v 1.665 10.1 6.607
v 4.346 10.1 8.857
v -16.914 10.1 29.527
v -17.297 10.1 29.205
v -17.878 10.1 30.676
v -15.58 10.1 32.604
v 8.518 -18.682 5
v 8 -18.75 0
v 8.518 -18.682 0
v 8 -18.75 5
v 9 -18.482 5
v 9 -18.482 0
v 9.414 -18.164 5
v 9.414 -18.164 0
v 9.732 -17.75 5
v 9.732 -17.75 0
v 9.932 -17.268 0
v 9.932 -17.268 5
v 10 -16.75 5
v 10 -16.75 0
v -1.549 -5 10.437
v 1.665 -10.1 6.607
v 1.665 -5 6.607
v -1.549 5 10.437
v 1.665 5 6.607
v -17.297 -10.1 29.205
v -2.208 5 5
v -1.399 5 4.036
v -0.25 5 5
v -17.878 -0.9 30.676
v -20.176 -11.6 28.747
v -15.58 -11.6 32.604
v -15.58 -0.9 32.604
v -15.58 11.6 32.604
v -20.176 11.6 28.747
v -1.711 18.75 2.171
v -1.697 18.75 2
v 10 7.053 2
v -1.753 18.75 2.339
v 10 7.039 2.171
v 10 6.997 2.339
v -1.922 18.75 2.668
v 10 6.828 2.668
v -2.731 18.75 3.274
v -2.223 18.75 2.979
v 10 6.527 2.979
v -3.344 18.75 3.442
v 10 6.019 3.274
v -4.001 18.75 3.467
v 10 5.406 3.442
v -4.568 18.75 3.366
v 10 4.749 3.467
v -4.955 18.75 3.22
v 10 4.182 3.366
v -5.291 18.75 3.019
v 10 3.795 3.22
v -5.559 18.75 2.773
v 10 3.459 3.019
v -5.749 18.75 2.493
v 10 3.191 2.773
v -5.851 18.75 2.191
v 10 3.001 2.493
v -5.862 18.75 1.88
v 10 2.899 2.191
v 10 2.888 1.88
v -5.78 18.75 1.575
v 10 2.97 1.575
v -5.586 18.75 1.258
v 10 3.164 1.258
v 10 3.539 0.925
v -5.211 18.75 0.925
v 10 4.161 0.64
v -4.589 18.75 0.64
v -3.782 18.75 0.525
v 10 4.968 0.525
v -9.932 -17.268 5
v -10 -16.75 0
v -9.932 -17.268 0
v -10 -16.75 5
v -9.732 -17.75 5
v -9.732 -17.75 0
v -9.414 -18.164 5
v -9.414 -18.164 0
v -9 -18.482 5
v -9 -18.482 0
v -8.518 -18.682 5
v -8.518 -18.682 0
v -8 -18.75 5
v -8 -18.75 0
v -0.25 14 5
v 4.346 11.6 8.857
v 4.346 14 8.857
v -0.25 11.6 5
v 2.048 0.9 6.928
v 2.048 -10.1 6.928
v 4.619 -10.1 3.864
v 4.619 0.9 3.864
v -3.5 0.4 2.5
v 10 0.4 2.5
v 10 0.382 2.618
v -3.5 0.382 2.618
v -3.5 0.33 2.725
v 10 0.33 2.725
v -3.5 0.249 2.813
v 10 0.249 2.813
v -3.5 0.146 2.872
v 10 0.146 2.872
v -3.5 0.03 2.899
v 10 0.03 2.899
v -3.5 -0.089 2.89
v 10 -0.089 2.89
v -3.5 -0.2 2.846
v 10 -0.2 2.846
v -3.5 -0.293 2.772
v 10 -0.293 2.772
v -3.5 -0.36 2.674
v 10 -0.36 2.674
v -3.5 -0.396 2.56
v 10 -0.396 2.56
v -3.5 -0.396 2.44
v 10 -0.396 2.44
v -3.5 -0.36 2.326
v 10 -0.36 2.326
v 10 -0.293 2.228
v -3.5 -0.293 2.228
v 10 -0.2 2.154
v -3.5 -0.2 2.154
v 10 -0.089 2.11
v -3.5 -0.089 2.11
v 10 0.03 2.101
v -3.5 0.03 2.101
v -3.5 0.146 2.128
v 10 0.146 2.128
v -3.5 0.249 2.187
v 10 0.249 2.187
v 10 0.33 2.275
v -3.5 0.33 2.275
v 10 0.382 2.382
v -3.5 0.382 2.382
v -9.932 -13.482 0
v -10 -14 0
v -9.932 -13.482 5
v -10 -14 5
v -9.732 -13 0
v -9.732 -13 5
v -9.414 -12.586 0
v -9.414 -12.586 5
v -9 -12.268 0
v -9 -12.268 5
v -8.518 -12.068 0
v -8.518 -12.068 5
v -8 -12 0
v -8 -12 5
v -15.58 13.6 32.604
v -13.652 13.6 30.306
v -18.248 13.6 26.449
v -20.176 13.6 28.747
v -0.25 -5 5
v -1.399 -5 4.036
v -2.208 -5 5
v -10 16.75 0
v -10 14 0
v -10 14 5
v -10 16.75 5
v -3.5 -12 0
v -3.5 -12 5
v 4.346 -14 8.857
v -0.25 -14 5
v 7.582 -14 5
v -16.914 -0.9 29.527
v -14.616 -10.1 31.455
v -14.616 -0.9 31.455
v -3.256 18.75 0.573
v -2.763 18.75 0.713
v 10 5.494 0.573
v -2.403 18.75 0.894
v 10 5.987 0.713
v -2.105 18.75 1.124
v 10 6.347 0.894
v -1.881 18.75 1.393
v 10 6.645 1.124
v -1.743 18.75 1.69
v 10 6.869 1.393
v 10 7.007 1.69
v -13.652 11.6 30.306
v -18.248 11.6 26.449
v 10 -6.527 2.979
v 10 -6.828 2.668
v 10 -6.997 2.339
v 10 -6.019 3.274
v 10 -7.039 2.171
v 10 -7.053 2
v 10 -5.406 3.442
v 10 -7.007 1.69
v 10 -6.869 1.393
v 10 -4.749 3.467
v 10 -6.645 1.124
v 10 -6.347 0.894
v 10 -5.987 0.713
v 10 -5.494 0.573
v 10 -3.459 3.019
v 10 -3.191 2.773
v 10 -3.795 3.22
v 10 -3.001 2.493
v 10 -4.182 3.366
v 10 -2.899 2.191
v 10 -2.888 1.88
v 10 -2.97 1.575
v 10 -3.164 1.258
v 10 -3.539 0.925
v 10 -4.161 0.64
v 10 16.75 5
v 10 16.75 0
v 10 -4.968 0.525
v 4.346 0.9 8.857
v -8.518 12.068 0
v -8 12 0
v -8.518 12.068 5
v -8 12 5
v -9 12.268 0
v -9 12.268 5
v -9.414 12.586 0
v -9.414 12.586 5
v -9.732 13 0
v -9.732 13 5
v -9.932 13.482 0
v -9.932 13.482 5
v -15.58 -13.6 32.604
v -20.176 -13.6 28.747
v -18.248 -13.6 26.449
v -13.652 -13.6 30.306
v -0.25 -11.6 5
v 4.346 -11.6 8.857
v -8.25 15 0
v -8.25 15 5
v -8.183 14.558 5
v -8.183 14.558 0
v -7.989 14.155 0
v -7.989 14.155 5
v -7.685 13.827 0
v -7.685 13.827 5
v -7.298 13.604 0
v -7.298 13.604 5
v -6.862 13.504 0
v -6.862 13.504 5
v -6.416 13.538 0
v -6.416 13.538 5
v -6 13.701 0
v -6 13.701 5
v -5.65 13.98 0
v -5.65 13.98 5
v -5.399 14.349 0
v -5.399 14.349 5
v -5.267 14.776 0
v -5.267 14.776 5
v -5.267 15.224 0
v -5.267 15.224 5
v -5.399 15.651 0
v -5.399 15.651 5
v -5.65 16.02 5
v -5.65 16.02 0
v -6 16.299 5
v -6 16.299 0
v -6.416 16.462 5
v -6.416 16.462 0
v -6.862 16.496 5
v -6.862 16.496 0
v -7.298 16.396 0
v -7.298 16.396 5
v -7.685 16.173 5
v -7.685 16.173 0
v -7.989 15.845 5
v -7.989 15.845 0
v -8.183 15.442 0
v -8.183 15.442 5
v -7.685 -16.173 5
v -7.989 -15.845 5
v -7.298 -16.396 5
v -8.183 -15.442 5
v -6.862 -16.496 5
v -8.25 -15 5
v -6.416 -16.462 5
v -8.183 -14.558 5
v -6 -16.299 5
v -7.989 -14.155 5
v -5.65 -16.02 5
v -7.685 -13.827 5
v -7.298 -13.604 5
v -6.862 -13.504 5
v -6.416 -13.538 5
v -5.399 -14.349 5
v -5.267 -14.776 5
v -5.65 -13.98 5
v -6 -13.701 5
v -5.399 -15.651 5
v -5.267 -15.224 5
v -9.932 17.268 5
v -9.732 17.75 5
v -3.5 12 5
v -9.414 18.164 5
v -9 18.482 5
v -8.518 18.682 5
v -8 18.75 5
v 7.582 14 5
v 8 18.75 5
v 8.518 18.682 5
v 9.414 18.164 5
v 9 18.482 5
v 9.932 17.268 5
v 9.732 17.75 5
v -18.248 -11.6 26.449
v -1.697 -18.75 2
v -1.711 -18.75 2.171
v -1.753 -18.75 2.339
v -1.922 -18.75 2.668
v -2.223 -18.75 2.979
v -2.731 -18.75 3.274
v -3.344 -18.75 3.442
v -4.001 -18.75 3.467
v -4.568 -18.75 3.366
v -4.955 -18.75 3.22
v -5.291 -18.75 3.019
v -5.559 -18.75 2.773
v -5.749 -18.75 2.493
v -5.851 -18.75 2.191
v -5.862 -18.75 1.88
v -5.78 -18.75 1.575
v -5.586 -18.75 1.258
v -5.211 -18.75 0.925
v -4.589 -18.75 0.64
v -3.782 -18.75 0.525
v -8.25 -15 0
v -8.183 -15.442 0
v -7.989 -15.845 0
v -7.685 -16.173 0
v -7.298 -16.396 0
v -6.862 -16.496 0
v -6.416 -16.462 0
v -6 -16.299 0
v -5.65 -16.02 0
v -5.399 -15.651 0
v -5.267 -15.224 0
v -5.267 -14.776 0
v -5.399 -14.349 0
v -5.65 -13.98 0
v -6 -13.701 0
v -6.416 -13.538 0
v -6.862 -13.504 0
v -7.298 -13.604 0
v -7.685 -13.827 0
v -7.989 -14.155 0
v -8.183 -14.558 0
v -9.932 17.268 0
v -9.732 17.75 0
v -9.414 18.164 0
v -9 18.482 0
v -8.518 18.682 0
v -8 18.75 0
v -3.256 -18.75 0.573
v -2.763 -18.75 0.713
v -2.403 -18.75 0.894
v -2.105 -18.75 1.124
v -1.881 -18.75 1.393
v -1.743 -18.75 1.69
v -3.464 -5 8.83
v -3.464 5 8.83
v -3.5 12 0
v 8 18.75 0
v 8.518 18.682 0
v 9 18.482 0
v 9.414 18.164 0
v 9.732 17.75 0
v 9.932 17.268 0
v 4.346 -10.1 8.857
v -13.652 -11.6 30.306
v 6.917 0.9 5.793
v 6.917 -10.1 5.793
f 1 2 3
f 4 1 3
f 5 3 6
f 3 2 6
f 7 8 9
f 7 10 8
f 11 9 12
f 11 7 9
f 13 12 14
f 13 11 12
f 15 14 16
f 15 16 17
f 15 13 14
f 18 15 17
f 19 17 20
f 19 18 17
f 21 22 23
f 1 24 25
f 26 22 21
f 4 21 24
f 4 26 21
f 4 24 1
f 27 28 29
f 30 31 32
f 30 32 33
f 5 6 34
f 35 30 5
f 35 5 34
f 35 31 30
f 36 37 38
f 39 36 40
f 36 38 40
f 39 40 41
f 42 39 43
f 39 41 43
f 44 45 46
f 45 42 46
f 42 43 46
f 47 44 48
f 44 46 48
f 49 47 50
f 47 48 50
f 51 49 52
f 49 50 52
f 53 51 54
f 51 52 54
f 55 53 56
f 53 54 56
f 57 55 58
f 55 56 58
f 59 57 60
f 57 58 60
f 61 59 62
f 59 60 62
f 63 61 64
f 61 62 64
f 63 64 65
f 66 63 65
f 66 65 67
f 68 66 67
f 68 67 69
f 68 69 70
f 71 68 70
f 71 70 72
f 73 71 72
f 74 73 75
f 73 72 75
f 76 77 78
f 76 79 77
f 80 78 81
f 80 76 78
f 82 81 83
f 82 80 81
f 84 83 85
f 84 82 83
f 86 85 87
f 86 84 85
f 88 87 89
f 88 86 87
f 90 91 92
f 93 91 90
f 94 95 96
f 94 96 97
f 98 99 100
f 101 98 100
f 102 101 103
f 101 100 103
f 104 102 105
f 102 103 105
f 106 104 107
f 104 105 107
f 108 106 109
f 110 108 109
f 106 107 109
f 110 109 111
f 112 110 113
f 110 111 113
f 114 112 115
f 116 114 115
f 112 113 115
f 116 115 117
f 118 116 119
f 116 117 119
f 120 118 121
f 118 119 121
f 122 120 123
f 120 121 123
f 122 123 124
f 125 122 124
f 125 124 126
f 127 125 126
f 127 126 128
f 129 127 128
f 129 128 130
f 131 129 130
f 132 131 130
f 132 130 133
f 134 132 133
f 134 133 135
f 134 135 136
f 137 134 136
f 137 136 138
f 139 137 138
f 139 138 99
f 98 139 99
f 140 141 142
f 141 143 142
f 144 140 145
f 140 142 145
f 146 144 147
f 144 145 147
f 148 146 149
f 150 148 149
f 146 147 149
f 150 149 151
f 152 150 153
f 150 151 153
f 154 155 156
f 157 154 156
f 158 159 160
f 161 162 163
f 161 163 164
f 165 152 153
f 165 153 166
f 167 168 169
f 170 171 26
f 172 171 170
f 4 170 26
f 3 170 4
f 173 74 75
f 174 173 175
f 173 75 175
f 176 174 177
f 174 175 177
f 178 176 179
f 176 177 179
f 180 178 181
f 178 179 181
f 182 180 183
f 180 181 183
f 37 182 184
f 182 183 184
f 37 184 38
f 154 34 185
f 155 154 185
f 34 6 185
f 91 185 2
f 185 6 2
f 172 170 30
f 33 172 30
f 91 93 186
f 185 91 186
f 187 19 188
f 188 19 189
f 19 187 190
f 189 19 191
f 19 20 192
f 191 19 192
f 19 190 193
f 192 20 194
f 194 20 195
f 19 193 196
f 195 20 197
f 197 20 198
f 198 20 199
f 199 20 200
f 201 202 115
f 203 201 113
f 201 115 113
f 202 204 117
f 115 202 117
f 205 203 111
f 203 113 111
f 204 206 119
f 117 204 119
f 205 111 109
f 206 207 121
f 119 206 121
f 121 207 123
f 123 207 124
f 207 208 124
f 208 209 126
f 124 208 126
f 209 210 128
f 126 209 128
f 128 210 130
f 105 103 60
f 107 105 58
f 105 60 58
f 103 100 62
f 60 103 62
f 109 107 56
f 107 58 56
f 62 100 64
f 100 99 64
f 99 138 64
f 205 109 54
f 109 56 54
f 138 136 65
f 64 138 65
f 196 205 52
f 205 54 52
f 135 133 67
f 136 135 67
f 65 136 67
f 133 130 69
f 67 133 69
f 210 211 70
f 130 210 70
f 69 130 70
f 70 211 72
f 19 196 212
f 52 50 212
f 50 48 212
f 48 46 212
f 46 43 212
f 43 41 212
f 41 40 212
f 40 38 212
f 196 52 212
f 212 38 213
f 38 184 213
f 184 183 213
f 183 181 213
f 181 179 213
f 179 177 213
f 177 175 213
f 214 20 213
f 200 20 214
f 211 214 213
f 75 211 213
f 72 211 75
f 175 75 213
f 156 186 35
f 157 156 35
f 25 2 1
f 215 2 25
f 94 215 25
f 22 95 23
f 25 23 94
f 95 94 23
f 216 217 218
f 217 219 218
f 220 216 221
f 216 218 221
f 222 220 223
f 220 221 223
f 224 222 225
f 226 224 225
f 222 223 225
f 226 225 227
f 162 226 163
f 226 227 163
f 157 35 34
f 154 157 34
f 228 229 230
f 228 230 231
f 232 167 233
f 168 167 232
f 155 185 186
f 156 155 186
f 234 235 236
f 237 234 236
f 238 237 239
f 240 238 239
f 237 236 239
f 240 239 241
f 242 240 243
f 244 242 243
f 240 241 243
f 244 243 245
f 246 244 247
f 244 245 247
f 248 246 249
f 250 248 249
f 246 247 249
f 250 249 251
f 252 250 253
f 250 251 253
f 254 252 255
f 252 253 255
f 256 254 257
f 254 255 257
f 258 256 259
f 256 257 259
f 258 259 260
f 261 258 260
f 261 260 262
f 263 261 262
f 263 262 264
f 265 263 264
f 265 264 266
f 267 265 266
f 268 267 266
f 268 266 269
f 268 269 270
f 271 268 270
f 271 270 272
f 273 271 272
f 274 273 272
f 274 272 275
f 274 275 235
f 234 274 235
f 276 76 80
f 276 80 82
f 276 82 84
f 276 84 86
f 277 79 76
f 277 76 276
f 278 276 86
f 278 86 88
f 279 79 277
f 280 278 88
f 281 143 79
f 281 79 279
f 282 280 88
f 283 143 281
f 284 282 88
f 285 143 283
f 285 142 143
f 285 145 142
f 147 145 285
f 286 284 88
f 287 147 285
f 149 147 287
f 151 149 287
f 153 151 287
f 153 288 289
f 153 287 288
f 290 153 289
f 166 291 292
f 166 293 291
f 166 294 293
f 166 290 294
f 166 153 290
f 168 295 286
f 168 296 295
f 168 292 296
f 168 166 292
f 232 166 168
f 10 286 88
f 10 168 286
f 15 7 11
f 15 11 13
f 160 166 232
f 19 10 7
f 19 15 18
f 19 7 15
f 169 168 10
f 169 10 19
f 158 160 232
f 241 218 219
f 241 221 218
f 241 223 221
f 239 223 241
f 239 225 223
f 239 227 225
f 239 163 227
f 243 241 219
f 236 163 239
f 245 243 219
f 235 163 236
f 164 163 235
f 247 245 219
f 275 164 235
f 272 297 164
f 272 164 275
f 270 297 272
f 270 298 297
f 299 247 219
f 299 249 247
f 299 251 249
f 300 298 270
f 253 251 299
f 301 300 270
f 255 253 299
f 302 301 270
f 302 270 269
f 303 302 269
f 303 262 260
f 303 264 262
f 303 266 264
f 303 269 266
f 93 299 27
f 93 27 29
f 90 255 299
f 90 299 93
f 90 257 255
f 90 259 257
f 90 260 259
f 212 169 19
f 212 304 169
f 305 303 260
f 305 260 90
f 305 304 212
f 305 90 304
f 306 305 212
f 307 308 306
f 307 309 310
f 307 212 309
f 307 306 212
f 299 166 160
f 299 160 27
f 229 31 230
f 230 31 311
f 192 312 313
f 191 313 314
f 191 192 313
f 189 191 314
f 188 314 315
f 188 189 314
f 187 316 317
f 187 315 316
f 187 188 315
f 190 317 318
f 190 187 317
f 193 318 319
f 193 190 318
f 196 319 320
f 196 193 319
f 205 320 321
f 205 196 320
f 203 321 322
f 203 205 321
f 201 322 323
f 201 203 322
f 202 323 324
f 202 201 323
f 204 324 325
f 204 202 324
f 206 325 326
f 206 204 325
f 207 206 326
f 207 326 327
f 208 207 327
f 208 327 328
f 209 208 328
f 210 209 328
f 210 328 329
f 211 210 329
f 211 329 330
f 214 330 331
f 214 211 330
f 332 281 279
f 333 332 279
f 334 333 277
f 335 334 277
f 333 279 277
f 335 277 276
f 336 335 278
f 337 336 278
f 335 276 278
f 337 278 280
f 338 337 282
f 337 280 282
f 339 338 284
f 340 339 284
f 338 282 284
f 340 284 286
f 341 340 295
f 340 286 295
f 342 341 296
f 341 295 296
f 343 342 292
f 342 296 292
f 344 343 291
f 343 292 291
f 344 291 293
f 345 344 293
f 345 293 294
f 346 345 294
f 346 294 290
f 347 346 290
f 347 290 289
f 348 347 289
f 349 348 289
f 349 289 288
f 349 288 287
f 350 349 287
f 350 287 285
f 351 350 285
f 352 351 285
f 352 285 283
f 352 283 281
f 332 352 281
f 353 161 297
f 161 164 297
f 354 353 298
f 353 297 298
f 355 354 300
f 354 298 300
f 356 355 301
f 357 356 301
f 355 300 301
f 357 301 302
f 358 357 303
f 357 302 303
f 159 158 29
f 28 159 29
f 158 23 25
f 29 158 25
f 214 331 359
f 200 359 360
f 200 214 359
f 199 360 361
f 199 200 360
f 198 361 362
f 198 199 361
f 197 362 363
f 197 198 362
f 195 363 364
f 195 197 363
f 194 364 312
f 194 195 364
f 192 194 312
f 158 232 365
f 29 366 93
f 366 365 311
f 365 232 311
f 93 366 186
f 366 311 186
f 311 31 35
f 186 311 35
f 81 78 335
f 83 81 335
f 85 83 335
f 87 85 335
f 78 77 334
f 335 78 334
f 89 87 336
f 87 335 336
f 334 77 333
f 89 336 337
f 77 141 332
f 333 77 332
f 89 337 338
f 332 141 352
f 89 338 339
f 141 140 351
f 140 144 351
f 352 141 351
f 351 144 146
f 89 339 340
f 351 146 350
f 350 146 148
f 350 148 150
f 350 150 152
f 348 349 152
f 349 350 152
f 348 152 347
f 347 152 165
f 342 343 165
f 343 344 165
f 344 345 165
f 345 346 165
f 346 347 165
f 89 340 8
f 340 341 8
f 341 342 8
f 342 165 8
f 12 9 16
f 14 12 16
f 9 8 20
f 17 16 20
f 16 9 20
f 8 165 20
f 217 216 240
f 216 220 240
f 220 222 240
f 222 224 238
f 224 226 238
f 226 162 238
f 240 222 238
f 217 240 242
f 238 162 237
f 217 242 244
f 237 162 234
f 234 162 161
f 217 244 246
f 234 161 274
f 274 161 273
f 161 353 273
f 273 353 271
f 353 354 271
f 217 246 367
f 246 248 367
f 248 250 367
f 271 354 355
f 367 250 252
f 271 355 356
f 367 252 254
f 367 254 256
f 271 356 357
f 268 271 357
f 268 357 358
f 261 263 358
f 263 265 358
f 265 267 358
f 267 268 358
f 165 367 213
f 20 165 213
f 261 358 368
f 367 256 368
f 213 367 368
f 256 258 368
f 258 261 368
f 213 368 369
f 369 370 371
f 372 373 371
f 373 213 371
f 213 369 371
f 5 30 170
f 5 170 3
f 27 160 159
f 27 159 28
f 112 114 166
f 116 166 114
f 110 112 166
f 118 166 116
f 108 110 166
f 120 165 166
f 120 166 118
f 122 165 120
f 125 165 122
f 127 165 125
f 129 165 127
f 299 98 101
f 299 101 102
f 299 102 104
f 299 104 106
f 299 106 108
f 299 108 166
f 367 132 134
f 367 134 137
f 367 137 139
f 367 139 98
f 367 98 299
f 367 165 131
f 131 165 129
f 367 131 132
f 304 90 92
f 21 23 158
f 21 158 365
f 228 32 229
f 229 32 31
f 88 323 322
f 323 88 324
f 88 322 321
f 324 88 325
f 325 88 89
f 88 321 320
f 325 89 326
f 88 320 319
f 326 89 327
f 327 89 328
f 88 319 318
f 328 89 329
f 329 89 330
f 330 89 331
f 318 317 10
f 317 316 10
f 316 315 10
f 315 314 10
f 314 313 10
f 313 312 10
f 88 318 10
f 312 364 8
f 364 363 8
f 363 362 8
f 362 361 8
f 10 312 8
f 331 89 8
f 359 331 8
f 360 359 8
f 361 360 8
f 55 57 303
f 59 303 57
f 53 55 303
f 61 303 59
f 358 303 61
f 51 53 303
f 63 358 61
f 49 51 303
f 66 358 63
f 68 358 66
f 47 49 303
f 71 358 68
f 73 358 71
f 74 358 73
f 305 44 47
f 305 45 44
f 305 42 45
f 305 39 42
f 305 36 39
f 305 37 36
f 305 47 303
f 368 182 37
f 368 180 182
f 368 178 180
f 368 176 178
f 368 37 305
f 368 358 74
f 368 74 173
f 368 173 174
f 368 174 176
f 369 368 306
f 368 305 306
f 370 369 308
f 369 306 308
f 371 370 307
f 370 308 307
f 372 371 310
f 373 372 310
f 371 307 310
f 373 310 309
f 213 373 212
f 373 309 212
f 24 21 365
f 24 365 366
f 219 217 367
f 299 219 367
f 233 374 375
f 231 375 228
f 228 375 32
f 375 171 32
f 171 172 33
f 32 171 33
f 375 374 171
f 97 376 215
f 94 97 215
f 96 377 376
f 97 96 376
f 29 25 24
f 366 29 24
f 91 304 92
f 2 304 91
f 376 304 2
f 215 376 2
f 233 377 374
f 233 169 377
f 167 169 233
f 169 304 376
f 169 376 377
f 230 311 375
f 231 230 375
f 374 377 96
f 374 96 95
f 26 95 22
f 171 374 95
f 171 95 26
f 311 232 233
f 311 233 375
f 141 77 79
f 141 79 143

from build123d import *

# Parameters (mm, degrees)
F0_W      = 20
F0_H      = 37.5
F1_DEPTH  = 5
F3_D      = 3
F4_W      = 6.5
F4_H      = 24
F5_DEPTH  = 6
F6_R      = 2
F10_DEPTH = 50
F14_W     = 23.2
F14_H     = 31
F15_DEPTH = 6
F16_W     = 20.2
F16_H     = 30.2
F17_DEPTH = 3.5
F19_DEPTH = 14
F20_W     = 10
F20_H     = 5
F21_DEPTH = 4
F22_W     = 11
F22_H     = 2
F23_DEPTH = 3
F24_W     = 11
F24_H     = 4
F25_DEPTH = 3
F27_DEPTH = 2
F29_DEPTH = 2
F30_R     = 0.4
F31_DEPTH = 70


# Not quite as in the source:
# - a feature names something its author has since deleted; it is built from what else it names


with BuildPart() as f1:
    # F0 (on Top) → F1 (new body)
    with BuildSketch(Plane.XY):
        Rectangle(F0_W, F0_H)
    extrude(amount=F1_DEPTH)

    # F3 (through all)
    with Locations(Plane(origin=(0, 0, 0), x_dir=(1, 0, 0), z_dir=(0, 0, -1))):
        with Locations((-6.75, 15), (-6.75, -15)):
            Hole(F3_D / 2)

    # F4 (on Top) → F5 (cut)
    with BuildSketch(Plane.XY):
        with Locations((-6.75, 0)):
            Rectangle(F4_W, F4_H)
    extrude(amount=F5_DEPTH, mode=Mode.SUBTRACT)

    # F6
    f6_edges = [f1.edges().sort_by_distance(p)[0] for p in [
        (-10, -18.75, 2.5),
        (10, -18.75, 2.5),
        (10, 18.75, 2.5),
        (-10, 18.75, 2.5),
        (-10, -12, 2.5),
        (-10, 12, 2.5),
    ]]
    fillet(f6_edges, radius=F6_R)

    # F9 (on line) → F10 (cut)
    with BuildSketch(Plane(origin=(5.0561841595, -5.0561841595, 0), x_dir=(0.7071067812, 0.7071067812, 0), z_dir=(0.7071067812, -0.7071067812, 0))):
        with BuildLine():
            ThreePointArc((10.5836309448, 0.525), (11.626613447, 0.9570174977), (12.0586309448, 2))
            ThreePointArc((12.0586309448, 2), (9.5406484425, 3.0429825023), (10.5836309448, 0.525))
        make_face()
    extrude(amount=-F10_DEPTH, mode=Mode.SUBTRACT)

    # F11: F1 across plane


with BuildPart() as f1_1:
    add(f1.part)
    add(f1.part.mirror(Plane.XZ), mode=Mode.INTERSECT)

    # F14 (on line) → F15 (join)
    with BuildSketch(Plane(origin=(2.3153133603, 0, 1.9427785867), x_dir=(0, 1, 0), z_dir=(0.7660444431, 0, 0.6427876097))):
        with Locations((0, 19.490919118)):
            Rectangle(F14_W, F14_H)
    extrude(amount=F15_DEPTH)

    # F16 (on face) → F17 (cut)
    with BuildSketch(Plane(origin=(6.911580019, 0, 5.7995042448), x_dir=(0, 1, 0), z_dir=(0.7660444431, 0, 0.6427876097))):
        with Locations((0, 18.390919118)):
            Rectangle(F16_W, F16_H)
    extrude(amount=-F17_DEPTH, mode=Mode.SUBTRACT)

    # F18 (on Front) → F19 (join, symmetric)
    with BuildSketch(Plane.XZ):
        Polygon((4.3462666587, 8.8567256581), (-0.25, 5), (7.582443736, 5), align=None)
    extrude(amount=F19_DEPTH, both=True)

    # F20 (on face) → F21 (cut)
    with BuildSketch(Plane(origin=(4.2304244681, 0, 3.5497476109), x_dir=(0, 1, 0), z_dir=(0.7660444431, 0, 0.6427876097))):
        with Locations((0, 6.490919118)):
            Rectangle(F20_W, F20_H)
    extrude(amount=-F21_DEPTH, mode=Mode.SUBTRACT)

    # F22 (on face) → F23 (cut)
    with BuildSketch(Plane(origin=(6.911580019, 0, 5.7995042448), x_dir=(0, 1, 0), z_dir=(0.7660444431, 0, 0.6427876097))):
        with Locations((4.6, 34.490919118)):
            Rectangle(F22_W, F22_H)
    extrude(amount=-F23_DEPTH, mode=Mode.SUBTRACT)

    # F24 (on face) → F25 (cut)
    with BuildSketch(Plane(origin=(6.911580019, 0, 5.7995042448), x_dir=(0, 1, 0), z_dir=(0.7660444431, 0, 0.6427876097))):
        with Locations((-4.6, 1.990919118)):
            Rectangle(F24_W, F24_H)
    extrude(amount=-F25_DEPTH, mode=Mode.SUBTRACT)

    # F26 (on face) → F27 (join)
    with BuildSketch(Plane.XZ.offset(11.6)):
        Polygon((-15.5801492416, 32.6041033948), (-20.1764159003, 28.7473777367), (-18.2480530712, 26.4492444073), (-13.6517864125, 30.3059700655), align=None)
    extrude(amount=F27_DEPTH)

    # F28 (on face) → F29 (join)
    with BuildSketch(Plane(origin=(0, 11.6, 0), x_dir=(-1, 0, 0), z_dir=(0, 1, 0))):
        Polygon((20.1764159003, 28.7473777367), (15.5801492416, 32.6041033948), (13.6517864125, 30.3059700655), (18.2480530712, 26.4492444073), align=None)
    extrude(amount=F29_DEPTH)

    # F30 (on face) → F31 (cut)
    with BuildSketch(Plane.YZ.offset(10)):
        with Locations((0, 2.5)):
            Circle(F30_R)
    extrude(amount=-F31_DEPTH, mode=Mode.SUBTRACT)


solid = f1_1.part
